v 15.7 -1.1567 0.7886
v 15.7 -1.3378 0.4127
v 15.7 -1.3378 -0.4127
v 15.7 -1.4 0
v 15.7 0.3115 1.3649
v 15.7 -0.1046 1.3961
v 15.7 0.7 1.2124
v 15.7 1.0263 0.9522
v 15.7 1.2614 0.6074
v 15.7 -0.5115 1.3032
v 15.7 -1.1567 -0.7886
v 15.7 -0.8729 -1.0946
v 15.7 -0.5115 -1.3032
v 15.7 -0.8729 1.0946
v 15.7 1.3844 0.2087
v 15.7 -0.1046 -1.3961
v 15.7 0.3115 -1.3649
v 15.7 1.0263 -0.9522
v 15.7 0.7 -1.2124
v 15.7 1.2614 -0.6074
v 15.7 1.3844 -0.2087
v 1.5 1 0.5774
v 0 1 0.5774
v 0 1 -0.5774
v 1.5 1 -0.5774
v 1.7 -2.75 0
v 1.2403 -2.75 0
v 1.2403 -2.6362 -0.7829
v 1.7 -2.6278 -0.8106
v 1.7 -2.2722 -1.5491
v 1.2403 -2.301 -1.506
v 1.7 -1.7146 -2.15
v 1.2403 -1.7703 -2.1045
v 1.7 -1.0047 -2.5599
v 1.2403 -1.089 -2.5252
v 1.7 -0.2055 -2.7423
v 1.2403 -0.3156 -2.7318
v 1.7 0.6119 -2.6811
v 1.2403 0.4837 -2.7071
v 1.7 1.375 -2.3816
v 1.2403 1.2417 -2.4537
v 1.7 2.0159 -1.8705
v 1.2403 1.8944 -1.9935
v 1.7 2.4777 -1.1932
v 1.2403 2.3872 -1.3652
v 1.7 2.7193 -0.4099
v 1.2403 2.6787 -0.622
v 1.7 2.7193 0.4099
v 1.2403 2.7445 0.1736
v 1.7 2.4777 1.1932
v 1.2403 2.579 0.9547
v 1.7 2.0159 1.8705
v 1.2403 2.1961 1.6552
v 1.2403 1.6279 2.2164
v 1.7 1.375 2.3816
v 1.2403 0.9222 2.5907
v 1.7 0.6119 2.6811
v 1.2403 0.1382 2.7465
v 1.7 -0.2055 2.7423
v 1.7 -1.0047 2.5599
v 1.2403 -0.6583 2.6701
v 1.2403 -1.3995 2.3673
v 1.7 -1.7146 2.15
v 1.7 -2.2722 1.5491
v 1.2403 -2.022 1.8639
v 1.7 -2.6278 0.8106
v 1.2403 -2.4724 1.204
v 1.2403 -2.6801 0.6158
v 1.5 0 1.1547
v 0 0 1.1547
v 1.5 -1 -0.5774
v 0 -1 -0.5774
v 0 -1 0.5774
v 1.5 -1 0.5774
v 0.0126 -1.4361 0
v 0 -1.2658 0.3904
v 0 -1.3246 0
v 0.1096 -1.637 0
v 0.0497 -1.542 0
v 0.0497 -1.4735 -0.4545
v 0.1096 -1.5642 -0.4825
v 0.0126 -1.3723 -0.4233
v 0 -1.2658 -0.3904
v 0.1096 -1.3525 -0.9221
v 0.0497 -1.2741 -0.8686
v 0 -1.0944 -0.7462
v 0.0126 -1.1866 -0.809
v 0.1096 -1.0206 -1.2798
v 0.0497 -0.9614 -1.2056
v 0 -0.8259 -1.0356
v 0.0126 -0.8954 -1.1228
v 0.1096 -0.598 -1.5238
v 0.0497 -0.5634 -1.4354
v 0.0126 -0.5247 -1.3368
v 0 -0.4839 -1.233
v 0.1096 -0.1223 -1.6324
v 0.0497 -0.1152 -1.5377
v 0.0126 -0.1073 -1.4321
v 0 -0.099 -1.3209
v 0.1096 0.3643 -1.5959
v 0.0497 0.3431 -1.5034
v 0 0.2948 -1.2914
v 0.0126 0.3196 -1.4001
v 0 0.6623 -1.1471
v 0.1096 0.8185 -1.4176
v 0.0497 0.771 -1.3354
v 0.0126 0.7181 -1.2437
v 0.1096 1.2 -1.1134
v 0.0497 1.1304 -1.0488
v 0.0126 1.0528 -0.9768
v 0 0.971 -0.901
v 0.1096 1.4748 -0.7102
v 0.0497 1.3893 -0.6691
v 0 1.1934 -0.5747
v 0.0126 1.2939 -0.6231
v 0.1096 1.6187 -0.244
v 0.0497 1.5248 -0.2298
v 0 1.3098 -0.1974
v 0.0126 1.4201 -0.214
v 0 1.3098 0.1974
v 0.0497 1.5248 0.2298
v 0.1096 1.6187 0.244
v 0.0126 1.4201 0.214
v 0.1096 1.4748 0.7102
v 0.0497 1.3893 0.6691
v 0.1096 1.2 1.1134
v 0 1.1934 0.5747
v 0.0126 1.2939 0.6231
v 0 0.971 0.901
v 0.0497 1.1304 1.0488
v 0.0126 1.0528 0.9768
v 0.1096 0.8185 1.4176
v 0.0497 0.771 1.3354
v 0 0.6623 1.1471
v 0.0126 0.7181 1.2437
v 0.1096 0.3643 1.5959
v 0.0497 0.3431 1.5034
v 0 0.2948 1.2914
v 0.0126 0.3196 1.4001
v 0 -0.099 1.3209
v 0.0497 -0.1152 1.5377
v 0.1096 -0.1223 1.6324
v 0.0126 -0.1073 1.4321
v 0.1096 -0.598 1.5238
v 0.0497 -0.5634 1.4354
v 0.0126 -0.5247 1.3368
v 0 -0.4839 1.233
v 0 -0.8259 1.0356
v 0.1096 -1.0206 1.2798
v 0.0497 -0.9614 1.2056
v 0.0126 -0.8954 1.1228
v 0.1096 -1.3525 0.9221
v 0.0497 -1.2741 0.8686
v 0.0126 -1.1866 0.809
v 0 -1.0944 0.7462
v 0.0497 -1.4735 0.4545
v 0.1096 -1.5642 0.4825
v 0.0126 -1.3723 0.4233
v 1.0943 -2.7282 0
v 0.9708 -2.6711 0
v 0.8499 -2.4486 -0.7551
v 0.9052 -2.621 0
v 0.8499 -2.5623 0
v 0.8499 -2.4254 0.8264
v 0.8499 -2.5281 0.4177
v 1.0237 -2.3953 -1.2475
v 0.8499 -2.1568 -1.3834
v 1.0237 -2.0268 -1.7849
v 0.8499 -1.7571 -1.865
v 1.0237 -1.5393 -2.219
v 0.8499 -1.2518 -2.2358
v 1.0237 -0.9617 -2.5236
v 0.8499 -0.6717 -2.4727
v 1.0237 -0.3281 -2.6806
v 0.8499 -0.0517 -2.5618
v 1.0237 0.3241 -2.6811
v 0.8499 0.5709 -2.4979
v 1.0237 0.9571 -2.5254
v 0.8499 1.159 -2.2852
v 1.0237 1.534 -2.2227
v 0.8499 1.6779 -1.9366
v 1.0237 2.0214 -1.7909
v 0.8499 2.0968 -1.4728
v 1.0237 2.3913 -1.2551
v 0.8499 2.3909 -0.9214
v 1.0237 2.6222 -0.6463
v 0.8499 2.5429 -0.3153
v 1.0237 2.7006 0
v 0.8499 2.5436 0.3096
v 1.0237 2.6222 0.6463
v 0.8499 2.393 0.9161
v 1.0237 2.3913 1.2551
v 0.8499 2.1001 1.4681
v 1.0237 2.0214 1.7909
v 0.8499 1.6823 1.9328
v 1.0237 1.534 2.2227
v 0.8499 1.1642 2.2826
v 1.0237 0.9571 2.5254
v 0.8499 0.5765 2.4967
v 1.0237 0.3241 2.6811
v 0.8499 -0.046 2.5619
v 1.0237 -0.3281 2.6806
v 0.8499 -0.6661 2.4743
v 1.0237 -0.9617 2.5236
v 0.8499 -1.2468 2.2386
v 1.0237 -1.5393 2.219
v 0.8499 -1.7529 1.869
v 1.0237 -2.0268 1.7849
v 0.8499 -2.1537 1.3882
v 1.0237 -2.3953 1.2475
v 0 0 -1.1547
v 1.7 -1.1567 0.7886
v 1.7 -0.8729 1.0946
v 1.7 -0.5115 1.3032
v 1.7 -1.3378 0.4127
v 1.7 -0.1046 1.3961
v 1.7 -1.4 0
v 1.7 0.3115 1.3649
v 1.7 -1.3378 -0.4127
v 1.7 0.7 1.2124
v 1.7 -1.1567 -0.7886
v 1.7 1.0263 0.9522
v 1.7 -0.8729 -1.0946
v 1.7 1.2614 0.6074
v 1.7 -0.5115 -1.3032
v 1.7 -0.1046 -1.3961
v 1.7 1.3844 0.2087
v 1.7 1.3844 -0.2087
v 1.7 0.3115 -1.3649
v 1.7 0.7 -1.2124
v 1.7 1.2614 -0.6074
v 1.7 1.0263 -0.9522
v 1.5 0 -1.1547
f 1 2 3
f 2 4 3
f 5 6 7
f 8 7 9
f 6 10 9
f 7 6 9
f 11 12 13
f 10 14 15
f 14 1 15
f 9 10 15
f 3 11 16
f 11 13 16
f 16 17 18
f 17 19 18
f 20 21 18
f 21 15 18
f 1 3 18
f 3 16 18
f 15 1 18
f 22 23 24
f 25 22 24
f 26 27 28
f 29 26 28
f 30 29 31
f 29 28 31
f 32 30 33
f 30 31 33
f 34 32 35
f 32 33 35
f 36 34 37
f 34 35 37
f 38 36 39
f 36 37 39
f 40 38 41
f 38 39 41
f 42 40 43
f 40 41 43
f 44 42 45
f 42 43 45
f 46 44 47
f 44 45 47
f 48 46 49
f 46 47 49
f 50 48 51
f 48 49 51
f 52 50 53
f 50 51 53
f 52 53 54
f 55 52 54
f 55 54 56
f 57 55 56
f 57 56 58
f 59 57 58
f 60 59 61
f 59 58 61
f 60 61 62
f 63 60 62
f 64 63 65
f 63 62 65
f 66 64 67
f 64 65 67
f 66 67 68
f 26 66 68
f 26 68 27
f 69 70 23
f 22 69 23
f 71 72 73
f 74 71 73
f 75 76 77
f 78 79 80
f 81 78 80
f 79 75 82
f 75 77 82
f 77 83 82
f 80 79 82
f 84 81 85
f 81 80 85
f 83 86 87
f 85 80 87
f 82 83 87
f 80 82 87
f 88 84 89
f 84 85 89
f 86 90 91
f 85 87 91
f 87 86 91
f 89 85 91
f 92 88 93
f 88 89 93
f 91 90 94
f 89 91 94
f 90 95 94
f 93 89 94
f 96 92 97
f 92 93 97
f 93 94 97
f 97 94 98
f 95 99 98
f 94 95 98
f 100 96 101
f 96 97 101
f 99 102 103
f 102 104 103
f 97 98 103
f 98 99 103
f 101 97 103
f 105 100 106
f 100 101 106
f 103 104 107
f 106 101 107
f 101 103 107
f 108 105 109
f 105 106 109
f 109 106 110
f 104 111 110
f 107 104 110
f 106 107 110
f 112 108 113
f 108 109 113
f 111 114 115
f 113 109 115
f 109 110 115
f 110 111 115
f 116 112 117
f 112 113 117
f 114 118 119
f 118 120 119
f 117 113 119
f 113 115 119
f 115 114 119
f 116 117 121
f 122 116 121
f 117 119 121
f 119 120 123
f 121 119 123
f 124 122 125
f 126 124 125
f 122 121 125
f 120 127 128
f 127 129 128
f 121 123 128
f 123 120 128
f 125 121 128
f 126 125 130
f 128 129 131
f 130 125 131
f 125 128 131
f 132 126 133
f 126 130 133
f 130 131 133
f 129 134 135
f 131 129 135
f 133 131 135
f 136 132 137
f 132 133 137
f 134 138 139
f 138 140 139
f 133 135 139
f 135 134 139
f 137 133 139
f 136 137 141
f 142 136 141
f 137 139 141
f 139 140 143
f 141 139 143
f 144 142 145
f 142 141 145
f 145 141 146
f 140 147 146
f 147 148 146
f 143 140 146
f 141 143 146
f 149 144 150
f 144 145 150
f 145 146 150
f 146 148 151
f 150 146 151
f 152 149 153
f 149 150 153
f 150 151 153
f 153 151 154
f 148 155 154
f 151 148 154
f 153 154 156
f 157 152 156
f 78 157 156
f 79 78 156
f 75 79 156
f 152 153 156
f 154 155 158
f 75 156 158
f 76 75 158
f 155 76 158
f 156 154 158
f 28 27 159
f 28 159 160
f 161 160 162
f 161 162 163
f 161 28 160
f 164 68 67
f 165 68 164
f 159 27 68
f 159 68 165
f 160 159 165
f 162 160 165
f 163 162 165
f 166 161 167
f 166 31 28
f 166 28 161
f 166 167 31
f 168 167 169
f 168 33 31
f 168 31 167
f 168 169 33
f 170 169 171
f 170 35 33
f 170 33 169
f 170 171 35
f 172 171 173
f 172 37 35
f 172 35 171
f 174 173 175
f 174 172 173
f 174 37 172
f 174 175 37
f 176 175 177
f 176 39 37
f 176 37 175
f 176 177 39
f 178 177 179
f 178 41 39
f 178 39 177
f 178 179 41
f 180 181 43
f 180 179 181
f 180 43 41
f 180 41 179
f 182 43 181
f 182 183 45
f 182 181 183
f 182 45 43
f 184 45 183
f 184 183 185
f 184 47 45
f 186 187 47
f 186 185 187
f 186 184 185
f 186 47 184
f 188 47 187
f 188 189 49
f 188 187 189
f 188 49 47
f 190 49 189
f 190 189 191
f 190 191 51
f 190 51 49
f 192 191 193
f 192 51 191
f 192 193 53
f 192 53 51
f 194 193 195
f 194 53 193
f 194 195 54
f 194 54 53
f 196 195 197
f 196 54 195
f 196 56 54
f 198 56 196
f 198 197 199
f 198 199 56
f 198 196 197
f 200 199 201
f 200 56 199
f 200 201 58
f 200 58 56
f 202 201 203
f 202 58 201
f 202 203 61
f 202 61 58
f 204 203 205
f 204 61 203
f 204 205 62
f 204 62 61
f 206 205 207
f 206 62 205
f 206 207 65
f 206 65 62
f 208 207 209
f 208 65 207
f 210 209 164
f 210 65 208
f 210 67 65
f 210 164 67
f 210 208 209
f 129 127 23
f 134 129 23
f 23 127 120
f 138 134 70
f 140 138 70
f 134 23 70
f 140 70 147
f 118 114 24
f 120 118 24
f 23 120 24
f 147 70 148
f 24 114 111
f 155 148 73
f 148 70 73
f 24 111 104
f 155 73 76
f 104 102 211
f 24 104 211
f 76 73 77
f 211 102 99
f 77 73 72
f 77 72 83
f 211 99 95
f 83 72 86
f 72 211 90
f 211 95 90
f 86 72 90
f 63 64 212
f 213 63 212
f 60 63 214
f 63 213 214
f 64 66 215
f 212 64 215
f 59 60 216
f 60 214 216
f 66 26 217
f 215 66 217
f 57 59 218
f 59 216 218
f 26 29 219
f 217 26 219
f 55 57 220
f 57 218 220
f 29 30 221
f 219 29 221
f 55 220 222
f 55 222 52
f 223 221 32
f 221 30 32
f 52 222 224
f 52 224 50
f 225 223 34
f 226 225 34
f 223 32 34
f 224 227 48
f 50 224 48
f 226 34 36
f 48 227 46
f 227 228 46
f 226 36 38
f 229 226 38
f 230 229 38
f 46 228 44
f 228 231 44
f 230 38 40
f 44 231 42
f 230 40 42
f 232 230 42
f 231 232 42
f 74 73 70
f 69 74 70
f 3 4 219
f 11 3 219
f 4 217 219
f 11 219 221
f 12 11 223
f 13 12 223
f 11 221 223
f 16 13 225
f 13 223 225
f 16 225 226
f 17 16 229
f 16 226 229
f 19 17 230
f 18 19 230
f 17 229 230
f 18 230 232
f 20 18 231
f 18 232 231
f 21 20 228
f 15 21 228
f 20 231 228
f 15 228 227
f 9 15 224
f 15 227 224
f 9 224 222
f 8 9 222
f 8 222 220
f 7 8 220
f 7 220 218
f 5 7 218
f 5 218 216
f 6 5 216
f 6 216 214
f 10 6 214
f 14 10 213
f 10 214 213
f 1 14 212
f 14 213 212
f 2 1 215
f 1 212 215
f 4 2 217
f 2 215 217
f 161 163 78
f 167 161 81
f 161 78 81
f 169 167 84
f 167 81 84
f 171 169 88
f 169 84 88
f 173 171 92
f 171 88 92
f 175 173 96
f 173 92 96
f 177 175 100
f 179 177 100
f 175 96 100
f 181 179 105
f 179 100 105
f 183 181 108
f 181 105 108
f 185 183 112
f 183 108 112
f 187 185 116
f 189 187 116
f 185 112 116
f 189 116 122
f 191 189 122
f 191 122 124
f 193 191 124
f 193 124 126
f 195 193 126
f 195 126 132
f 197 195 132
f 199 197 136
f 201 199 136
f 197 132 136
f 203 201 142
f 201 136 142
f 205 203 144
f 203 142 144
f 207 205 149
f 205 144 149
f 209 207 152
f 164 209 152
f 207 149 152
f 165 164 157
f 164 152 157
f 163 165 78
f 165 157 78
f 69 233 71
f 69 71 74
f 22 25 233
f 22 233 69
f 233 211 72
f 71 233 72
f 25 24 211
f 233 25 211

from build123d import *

# Parameters (mm, degrees)
CUT_EXTRUDE1_DEPTH = 1.5
FILLET1_R          = 0.5


with BuildPart() as part:
    # Sketch1 → Revolve1 (revolve)
    with BuildSketch(Plane.XY, mode=Mode.PRIVATE) as revolve1_sk:
        Polygon((15.7, 0), (15.7, 1.4), (1.7, 1.4), (1.7, 2.75), (1, 2.75), (0, 1.5), (0, 0), align=None)
    revolve(revolve1_sk.sketch.rotate(Axis((0, 0, 0), (1, 0, 0)), 180), axis=Axis((0, 0, 0), (1, 0, 0)))

    # Sketch2 → Cut-Extrude1 (cut)
    with BuildSketch(Plane.ZY):
        Polygon((1.154700538, 0), (0.577350269, 1), (-0.577350269, 1), (-1.154700538, 0), (-0.577350269, -1), (0.577350269, -1), align=None)
    extrude(amount=-CUT_EXTRUDE1_DEPTH, mode=Mode.SUBTRACT)

    # Fillet1
    fillet1_edges = [part.edges().sort_by_distance(p)[0] for p in [
        (1, 2.75, 0),
        (0, 1.5, 0),
    ]]
    fillet(fillet1_edges, radius=FILLET1_R)


solid = part.part
